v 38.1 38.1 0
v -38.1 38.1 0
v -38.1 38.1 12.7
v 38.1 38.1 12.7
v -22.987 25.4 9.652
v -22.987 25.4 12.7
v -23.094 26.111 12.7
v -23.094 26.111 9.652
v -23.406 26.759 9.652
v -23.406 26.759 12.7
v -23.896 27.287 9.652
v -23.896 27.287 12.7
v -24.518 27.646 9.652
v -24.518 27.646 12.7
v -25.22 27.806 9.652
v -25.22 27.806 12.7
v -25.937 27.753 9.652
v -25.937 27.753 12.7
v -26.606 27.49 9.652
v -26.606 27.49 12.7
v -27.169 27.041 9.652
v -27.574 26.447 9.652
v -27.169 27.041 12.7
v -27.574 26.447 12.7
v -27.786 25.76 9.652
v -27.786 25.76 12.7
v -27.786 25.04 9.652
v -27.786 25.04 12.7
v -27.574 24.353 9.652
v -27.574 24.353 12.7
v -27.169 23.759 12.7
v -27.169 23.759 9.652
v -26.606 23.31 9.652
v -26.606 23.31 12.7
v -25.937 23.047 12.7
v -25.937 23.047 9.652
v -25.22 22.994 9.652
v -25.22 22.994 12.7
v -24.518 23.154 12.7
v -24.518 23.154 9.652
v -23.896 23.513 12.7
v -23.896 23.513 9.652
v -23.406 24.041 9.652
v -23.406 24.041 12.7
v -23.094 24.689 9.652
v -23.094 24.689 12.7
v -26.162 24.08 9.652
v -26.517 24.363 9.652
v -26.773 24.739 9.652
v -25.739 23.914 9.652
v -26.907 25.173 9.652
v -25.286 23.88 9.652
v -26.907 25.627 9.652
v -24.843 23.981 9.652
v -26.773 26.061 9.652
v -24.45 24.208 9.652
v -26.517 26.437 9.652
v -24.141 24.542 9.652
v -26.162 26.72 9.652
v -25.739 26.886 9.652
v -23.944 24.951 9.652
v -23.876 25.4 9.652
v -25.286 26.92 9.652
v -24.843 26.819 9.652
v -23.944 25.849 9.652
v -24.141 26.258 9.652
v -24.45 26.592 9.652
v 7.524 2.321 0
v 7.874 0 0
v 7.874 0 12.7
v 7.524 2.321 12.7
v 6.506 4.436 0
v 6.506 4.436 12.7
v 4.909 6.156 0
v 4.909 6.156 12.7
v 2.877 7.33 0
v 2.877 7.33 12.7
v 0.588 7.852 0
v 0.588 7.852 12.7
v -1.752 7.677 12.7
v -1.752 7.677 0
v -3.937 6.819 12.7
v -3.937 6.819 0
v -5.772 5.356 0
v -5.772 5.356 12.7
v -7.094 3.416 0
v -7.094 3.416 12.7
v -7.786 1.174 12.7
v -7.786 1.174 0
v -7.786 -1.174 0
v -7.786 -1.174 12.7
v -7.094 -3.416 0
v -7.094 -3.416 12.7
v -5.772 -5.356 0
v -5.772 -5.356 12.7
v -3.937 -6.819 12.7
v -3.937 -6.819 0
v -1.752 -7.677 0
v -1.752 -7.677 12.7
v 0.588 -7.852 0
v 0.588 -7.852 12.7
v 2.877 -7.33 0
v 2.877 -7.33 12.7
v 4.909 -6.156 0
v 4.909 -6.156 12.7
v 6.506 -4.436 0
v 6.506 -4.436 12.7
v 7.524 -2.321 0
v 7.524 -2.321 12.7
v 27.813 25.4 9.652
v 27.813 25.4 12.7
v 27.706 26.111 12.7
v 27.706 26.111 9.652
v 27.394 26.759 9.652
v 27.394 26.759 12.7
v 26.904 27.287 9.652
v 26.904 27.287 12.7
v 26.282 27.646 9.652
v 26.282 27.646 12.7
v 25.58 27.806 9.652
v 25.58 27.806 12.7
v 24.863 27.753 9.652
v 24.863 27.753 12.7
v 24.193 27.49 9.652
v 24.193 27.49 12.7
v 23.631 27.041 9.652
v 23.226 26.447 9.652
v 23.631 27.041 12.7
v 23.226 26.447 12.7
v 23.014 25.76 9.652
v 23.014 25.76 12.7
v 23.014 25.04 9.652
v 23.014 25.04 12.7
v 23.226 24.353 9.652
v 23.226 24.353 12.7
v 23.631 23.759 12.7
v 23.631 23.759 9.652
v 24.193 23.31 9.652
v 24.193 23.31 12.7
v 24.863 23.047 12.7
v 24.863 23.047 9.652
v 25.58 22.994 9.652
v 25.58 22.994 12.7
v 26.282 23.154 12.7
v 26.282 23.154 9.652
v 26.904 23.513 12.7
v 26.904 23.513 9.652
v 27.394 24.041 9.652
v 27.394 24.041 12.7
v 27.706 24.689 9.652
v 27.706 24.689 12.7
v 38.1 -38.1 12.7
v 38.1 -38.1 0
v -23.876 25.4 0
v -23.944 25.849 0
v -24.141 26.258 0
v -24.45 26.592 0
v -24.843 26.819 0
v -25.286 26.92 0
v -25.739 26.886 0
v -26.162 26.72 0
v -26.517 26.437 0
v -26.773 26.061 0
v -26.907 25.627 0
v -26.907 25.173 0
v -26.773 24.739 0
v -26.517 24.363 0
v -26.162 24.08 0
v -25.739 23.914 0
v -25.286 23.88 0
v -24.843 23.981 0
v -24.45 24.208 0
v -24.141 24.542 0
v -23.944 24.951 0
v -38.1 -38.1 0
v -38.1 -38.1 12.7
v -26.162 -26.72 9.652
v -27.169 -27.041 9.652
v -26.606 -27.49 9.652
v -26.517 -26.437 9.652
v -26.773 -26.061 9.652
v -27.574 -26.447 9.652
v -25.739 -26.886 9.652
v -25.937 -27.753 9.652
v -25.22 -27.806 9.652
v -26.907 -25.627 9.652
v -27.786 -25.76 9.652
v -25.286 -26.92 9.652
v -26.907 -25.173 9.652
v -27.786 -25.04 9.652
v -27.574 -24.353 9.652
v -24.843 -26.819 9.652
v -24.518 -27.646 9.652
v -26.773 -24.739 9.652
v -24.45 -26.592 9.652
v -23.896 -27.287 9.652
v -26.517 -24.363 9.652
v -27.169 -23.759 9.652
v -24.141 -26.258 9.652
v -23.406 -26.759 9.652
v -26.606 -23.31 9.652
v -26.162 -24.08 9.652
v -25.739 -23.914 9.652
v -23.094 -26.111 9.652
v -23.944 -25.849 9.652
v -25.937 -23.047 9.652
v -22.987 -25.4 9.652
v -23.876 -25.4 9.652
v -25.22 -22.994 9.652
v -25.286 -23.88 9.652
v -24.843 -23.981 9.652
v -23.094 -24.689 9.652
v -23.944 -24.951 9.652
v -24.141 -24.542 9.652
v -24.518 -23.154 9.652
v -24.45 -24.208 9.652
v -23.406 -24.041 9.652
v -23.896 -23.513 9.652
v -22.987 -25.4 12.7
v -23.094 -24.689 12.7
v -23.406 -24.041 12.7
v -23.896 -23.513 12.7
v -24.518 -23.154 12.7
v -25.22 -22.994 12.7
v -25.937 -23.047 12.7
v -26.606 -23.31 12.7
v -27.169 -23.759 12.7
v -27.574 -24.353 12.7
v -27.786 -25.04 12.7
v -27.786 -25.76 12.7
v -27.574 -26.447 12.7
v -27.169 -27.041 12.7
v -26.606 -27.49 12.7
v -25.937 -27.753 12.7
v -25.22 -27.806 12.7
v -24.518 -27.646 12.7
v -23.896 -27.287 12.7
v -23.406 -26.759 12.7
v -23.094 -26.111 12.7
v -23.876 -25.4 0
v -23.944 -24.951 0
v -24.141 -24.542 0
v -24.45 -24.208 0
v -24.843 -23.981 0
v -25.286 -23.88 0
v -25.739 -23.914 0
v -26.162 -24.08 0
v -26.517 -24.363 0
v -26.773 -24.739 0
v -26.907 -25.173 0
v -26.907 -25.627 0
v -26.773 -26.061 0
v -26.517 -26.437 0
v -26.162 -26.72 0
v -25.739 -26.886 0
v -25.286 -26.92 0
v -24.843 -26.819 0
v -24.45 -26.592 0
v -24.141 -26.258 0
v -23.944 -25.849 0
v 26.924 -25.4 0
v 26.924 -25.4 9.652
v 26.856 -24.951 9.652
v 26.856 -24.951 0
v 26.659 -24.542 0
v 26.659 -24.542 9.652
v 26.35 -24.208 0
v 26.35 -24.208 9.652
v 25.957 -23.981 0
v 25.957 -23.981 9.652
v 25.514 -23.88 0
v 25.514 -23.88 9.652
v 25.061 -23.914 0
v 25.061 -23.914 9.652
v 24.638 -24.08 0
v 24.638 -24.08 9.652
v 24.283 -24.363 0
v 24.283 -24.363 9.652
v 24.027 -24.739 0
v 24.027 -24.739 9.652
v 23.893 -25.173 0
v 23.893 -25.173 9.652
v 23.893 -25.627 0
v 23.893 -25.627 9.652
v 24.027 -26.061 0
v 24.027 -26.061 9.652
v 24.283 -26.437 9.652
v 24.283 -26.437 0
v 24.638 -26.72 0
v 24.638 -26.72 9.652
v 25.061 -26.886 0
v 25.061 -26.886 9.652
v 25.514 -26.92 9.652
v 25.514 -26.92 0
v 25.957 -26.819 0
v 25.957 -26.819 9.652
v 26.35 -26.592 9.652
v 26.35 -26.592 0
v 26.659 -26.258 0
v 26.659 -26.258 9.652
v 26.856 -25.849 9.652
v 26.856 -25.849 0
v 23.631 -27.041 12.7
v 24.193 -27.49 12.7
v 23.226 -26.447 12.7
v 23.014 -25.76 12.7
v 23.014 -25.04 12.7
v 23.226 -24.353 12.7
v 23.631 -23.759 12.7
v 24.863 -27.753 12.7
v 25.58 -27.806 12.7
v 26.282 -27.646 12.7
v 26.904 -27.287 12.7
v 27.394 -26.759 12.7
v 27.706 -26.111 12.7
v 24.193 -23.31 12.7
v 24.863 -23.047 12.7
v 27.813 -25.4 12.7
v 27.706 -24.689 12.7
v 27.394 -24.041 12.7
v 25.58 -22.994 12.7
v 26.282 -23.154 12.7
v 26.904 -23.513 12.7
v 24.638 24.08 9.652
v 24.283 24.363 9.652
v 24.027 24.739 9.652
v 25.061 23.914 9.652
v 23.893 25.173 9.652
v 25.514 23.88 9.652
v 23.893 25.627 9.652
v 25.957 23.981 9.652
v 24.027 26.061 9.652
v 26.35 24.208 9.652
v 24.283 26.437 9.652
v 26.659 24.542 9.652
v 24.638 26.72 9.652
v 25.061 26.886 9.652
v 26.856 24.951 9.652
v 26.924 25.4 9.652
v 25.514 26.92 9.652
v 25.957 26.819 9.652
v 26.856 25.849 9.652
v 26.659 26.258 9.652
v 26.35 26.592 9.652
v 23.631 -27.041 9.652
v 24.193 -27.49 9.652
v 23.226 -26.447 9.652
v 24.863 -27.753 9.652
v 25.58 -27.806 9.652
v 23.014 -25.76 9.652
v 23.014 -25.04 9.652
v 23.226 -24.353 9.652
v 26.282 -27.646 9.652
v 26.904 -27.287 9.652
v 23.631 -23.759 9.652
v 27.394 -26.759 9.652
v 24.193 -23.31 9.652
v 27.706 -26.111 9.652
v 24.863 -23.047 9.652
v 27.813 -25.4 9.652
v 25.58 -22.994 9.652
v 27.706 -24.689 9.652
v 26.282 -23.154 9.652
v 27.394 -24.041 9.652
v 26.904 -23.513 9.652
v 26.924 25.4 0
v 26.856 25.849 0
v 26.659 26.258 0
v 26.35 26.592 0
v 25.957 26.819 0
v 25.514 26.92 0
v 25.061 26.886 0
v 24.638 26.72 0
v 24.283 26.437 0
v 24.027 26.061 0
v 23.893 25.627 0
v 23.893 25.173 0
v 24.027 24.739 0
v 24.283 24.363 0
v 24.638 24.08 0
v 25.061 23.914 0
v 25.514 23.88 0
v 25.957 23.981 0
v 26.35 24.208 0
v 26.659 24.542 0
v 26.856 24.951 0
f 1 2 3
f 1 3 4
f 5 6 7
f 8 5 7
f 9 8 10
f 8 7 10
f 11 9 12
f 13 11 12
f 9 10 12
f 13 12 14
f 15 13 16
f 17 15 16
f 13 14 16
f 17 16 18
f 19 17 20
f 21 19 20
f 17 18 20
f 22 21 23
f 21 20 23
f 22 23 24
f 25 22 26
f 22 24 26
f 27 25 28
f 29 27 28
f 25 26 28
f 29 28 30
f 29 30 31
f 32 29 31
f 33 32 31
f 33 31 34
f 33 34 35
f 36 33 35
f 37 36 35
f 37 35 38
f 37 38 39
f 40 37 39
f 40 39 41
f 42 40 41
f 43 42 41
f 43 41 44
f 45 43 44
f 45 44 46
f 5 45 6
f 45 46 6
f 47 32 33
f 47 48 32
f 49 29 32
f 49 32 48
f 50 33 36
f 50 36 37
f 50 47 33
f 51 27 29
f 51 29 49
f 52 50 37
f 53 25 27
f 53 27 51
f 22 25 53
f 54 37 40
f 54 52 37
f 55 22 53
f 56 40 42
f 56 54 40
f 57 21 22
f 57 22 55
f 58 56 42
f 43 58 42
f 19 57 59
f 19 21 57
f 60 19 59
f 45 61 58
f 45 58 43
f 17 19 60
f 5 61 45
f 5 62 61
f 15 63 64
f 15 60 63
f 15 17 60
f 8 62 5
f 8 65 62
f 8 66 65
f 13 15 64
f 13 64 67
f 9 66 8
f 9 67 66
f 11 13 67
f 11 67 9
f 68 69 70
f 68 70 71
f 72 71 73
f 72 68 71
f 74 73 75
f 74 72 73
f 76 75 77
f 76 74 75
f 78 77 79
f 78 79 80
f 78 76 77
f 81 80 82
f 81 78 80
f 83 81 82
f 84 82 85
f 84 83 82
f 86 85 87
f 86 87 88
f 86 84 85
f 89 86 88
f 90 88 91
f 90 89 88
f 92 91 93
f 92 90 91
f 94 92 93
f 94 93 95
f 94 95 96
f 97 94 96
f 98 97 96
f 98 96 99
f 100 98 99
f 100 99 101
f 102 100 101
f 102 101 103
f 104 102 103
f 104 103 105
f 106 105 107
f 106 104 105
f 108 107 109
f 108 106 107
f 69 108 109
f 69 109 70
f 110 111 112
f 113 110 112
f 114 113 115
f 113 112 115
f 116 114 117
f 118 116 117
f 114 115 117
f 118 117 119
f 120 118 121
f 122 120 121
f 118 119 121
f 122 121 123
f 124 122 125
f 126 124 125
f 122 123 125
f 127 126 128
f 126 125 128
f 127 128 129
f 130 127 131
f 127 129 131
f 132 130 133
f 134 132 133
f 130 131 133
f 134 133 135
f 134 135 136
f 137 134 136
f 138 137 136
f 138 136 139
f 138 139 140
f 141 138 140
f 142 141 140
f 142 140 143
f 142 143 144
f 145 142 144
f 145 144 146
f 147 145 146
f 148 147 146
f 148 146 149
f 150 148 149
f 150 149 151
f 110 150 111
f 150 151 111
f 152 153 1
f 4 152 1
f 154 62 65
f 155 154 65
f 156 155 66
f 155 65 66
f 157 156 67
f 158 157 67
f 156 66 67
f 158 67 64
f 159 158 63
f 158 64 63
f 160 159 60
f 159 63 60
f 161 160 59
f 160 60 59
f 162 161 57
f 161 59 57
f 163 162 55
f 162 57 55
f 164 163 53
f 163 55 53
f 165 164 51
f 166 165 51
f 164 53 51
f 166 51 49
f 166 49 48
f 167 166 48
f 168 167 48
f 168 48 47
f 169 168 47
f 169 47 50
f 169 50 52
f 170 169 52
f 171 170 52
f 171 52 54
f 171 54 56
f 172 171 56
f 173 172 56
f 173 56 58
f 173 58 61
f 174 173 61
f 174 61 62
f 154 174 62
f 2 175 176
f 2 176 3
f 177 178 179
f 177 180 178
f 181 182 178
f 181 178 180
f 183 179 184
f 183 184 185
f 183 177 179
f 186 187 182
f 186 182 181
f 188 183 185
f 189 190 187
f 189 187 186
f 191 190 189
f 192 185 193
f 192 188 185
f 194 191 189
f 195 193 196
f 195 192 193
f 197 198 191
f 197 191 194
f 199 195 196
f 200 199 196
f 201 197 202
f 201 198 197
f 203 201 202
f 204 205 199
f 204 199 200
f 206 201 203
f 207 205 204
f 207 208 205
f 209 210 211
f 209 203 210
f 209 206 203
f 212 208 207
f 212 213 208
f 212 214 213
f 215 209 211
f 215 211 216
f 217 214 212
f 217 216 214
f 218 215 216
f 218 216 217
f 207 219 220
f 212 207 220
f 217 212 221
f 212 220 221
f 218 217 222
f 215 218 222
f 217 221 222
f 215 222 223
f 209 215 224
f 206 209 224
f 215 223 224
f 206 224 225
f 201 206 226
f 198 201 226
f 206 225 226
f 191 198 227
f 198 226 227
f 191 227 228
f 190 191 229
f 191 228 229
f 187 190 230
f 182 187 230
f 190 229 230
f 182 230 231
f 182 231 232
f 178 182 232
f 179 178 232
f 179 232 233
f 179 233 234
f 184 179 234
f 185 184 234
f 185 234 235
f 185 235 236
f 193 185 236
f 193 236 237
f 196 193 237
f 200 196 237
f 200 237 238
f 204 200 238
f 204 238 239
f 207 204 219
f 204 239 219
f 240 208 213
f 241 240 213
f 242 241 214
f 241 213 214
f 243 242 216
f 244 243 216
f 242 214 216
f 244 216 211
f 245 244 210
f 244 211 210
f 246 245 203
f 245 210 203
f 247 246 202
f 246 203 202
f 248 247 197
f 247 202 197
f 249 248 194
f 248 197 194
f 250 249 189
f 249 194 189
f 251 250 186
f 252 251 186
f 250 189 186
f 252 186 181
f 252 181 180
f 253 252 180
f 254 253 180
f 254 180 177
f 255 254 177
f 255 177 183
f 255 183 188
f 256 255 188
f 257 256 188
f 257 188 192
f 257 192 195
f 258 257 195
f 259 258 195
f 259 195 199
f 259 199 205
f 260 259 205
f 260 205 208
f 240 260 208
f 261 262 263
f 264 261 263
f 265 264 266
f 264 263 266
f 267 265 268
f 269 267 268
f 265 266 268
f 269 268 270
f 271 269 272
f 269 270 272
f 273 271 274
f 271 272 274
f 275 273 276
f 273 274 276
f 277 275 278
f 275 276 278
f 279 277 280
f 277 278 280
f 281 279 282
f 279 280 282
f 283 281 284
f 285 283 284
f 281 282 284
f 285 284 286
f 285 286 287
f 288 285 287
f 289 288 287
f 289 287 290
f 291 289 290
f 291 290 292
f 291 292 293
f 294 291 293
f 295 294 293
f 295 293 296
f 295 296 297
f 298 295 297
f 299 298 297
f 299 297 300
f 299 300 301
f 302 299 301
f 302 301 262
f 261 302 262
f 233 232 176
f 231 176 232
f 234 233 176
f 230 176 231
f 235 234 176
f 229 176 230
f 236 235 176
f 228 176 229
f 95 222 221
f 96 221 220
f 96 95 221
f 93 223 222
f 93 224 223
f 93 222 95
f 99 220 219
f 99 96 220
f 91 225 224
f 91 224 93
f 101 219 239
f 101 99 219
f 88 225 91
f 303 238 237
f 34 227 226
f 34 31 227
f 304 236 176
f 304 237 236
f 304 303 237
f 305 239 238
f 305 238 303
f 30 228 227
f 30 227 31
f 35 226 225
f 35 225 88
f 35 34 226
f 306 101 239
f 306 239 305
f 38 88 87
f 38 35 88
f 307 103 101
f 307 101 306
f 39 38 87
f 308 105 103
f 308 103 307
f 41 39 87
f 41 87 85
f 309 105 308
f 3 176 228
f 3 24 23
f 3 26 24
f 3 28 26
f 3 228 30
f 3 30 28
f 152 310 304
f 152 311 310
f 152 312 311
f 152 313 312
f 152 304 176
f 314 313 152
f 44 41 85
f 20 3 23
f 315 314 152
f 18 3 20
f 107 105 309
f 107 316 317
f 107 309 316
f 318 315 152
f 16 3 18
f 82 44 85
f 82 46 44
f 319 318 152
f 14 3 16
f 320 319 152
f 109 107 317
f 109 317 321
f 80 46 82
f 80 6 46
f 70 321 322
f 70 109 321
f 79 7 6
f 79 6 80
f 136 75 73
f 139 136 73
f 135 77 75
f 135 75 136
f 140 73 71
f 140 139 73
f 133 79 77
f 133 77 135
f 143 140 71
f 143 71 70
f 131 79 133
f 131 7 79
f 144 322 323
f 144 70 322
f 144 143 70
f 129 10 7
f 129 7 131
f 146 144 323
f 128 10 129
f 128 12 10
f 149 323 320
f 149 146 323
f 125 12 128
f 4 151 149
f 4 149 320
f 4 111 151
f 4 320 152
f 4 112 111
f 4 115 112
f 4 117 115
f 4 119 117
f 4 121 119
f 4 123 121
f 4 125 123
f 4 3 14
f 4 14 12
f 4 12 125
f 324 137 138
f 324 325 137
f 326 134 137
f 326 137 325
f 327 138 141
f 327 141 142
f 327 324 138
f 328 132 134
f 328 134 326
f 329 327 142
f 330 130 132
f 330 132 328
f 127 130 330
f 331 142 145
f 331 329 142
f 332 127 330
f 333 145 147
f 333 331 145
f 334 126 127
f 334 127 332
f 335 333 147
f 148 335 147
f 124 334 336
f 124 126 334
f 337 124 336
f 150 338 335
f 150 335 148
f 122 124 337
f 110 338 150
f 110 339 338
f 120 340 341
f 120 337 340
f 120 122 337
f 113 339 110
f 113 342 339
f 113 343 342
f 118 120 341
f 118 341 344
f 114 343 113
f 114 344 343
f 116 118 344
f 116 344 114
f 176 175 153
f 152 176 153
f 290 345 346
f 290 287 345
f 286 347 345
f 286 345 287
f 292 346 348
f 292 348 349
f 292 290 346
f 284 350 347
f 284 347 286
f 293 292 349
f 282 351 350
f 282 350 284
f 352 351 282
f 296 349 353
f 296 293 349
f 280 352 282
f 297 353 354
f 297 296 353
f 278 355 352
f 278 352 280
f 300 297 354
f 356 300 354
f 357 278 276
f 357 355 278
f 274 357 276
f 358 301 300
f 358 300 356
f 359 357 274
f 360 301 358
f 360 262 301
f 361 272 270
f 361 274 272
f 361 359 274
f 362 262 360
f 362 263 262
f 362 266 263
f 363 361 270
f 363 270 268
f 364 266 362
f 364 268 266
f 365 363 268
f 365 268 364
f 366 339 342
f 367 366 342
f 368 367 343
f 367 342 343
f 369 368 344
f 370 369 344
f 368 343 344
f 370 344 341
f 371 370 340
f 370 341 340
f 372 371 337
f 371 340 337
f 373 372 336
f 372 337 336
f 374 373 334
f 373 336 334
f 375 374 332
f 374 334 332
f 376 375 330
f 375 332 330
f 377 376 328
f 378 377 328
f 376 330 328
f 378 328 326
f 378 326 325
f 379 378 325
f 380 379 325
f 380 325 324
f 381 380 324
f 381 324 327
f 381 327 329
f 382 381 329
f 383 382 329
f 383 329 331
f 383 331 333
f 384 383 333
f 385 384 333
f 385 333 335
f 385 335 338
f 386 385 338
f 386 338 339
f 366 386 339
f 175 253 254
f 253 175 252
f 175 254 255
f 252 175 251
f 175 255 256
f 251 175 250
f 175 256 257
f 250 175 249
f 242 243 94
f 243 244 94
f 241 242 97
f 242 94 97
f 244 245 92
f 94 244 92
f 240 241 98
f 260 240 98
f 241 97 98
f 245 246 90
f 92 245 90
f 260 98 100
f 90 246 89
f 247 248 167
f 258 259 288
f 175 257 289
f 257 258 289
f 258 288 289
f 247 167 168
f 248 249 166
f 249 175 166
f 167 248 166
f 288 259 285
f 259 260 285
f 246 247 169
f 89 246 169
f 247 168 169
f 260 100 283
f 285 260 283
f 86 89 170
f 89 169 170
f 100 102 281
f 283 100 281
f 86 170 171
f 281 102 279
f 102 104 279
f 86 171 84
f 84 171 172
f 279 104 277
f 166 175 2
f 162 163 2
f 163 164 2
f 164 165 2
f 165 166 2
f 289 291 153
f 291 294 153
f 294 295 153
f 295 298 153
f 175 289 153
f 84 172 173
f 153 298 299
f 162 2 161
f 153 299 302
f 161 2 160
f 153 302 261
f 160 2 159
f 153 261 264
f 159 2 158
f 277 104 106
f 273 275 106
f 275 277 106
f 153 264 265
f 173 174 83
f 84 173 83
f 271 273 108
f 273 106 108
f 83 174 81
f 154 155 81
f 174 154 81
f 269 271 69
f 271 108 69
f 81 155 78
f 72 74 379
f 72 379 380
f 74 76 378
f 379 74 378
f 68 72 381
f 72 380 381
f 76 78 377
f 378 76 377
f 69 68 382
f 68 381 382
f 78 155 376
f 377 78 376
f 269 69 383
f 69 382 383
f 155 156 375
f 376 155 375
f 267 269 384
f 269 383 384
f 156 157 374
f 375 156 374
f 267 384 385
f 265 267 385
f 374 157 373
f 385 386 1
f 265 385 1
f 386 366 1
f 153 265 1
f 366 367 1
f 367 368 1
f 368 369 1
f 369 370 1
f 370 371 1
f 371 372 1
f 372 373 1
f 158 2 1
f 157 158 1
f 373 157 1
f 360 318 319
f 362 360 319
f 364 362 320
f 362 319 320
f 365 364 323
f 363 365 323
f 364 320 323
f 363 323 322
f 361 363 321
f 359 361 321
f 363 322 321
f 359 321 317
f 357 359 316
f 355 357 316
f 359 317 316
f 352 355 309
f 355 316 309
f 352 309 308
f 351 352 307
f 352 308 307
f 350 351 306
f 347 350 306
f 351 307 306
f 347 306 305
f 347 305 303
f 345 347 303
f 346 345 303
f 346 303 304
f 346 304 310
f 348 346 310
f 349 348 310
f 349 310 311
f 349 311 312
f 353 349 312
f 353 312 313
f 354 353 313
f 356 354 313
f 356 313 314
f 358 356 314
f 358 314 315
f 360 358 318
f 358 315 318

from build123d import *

# Parameters (mm, degrees)
SKETCH2_W           = 76.2
SKETCH2_H           = 76.2
SKETCH2_R           = 7.874
BOSS_EXTRUDE1_DEPTH = 12.7
SKETCH6_R           = 2.413
CUT_EXTRUDE3_DEPTH  = 3.048
SKETCH7_R           = 1.524
CUT_EXTRUDE4_DEPTH  = 55.739209932


with BuildPart() as part:
    # Sketch2 → Boss-Extrude1 (new body)
    with BuildSketch(Plane.XY):
        Rectangle(SKETCH2_W, SKETCH2_H)
        Circle(SKETCH2_R, mode=Mode.SUBTRACT)
    extrude(amount=BOSS_EXTRUDE1_DEPTH)

    # Sketch6 → Cut-Extrude3 (cut)
    with BuildSketch(Plane.XY.offset(12.7)):
        with Locations((-25.4, 25.4)):
            Circle(SKETCH6_R)
        with Locations((25.4, 25.4)):
            Circle(SKETCH6_R)
        with Locations((25.4, -25.4)):
            Circle(SKETCH6_R)
        with Locations((-25.4, -25.4)):
            Circle(SKETCH6_R)
    extrude(amount=-CUT_EXTRUDE3_DEPTH, mode=Mode.SUBTRACT)

    # Sketch7 → Cut-Extrude4 (cut, through all)
    with BuildSketch(Plane.XY.offset(9.652)):
        with Locations((-25.4, 25.4)):
            Circle(SKETCH7_R)
        with Locations((25.4, 25.4)):
            Circle(SKETCH7_R)
        with Locations((25.4, -25.4)):
            Circle(SKETCH7_R)
        with Locations((-25.4, -25.4)):
            Circle(SKETCH7_R)
    extrude(amount=-CUT_EXTRUDE4_DEPTH, mode=Mode.SUBTRACT)


solid = part.part
